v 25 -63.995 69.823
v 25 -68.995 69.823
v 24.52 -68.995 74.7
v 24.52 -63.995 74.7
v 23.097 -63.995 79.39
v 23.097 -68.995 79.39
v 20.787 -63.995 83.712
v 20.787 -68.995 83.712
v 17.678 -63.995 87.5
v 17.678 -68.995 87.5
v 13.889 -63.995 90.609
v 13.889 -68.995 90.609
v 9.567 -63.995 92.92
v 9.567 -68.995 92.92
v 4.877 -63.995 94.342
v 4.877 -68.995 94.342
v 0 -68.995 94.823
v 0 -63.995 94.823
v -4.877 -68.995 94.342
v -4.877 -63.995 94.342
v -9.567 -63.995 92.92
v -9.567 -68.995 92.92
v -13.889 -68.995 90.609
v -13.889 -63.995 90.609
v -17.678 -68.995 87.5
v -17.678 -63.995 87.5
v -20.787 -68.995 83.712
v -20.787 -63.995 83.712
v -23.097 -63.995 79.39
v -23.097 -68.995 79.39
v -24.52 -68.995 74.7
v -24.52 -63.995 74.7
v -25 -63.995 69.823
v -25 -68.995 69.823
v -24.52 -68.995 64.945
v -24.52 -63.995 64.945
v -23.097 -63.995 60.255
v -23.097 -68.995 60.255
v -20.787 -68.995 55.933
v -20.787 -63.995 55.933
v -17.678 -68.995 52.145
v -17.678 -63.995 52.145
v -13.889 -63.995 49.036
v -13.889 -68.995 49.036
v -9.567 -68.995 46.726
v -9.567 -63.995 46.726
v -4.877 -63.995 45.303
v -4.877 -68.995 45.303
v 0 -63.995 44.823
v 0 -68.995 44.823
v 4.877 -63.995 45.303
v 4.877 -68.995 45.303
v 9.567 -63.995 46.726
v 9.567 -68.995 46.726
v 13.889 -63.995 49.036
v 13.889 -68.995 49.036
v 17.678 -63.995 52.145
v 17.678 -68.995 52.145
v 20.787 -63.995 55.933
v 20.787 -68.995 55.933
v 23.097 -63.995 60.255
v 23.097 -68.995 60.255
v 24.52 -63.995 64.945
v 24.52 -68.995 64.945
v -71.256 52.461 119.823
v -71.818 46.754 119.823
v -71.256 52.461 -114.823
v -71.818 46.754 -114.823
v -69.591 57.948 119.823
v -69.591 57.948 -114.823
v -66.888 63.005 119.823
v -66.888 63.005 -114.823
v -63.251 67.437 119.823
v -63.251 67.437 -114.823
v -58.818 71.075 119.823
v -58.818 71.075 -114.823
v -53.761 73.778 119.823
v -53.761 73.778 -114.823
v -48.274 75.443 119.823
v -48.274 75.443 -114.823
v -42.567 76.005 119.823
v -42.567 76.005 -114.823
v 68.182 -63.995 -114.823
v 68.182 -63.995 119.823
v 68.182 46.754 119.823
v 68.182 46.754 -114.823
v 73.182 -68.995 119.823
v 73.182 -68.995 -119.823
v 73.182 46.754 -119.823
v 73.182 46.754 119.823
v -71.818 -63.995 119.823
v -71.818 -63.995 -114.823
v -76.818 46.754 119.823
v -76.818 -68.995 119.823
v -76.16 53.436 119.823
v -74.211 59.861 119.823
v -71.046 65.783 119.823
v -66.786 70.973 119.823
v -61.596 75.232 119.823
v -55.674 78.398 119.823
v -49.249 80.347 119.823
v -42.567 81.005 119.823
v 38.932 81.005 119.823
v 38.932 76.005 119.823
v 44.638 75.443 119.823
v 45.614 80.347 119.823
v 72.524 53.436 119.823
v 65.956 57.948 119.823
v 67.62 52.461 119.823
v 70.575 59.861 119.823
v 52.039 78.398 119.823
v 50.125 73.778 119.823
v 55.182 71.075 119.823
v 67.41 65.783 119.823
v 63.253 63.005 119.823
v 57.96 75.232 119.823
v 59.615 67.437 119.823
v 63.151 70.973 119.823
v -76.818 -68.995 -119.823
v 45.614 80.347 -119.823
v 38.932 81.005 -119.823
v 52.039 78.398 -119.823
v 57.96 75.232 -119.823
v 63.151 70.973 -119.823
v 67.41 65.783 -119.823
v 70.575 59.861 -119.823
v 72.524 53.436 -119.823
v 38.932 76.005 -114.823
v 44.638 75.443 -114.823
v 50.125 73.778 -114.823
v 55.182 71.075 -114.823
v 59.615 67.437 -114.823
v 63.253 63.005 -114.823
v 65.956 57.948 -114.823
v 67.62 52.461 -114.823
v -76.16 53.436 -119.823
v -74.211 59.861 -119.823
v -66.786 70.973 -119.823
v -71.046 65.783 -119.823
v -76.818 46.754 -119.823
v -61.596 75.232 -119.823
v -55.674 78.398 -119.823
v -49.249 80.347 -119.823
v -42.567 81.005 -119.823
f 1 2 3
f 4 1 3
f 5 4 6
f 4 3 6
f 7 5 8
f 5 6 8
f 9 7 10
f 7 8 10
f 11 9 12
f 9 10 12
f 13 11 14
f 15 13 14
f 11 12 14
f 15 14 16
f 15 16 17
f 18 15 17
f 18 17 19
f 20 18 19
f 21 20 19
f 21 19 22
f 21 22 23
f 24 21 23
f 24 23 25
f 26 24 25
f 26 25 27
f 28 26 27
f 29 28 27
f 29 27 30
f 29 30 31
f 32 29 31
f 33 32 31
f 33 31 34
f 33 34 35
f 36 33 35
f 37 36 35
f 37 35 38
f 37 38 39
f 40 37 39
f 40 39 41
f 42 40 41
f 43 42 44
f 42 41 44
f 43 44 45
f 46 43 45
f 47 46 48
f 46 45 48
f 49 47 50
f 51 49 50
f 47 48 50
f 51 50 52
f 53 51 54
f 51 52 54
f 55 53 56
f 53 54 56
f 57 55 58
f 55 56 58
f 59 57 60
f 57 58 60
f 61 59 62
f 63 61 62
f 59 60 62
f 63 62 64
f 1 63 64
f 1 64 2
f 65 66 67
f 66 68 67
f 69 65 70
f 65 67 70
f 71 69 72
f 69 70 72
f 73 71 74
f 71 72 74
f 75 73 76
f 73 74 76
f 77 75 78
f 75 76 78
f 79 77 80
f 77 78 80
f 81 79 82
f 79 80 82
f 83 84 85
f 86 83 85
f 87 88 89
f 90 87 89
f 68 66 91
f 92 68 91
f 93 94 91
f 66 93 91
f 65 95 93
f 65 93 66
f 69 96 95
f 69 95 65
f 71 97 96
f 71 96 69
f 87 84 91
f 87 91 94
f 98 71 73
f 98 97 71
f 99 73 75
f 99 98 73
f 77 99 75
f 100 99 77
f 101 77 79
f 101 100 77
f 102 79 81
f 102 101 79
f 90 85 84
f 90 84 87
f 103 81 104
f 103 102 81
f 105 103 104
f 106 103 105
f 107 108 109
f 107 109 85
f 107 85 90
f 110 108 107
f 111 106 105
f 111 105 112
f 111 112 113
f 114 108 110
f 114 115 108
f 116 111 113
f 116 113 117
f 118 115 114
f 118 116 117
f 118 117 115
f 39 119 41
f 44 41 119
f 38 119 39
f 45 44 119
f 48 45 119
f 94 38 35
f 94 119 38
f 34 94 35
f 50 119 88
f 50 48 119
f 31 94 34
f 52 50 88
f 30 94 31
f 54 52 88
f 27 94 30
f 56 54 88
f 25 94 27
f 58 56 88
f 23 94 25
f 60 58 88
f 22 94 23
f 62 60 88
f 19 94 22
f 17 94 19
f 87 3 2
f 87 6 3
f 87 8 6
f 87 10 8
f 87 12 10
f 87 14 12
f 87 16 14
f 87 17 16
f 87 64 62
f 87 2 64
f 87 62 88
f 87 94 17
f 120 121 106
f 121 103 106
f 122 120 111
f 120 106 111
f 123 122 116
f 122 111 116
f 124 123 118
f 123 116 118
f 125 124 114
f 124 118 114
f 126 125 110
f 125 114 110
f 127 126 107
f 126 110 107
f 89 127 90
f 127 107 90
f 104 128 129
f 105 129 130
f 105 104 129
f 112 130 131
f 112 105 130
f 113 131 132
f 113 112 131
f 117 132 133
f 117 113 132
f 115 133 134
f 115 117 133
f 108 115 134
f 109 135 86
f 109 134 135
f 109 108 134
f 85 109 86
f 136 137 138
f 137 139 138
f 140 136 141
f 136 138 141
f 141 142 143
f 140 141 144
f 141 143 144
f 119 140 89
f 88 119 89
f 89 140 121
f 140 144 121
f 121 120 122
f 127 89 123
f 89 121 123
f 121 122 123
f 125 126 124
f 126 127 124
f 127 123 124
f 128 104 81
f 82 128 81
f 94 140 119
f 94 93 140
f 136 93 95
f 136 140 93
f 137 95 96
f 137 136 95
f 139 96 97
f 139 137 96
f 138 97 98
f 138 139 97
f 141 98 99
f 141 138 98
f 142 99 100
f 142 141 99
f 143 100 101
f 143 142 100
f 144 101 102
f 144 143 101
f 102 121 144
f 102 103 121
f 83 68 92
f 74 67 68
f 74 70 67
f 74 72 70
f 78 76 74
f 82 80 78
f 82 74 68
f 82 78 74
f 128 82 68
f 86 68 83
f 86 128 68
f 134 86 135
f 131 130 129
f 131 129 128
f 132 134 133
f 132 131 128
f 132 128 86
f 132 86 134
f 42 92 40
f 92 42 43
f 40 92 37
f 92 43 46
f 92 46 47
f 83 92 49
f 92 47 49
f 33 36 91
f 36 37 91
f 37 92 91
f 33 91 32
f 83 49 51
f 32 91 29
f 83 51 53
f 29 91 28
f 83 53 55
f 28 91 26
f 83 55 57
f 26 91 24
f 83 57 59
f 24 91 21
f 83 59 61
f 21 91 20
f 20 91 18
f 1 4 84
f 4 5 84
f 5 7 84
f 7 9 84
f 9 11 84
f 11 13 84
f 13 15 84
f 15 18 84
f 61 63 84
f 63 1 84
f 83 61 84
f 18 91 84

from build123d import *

# Parameters (mm, degrees)
F1_DEPTH = 119.822524
F2_R     = 34.250378
F3_T     = -5
F4_R     = 25
F5_DEPTH = 25


with BuildPart() as f1:
    # F0 (on Top) → F1 (new body, symmetric)
    with BuildSketch(Plane.XY):
        Polygon((-76.817763, -68.995313), (73.182237, -68.995313), (73.182237, 81.004687), (-1.817763, 81.004687), (-76.817763, 81.004687), align=None)
    extrude(amount=F1_DEPTH, both=True)

    # F2
    f2_edges = [f1.edges().sort_by_distance(p)[0] for p in [
        (73.182237, 81.004687, 0),
        (-76.817763, 81.004687, 0),
    ]]
    fillet(f2_edges, radius=F2_R)

    # F3
    f3_openings = [f1.faces().sort_by_distance(p)[0] for p in [
        (-1.817763, 4.463075, 119.822524),
    ]]
    offset(amount=F3_T, openings=f3_openings)

    # F4 (on face) → F5 (cut)
    with BuildSketch(Plane.XZ.offset(68.995313)):
        with Locations((0, 69.822524)):
            Circle(F4_R)
    extrude(amount=-F5_DEPTH, mode=Mode.SUBTRACT)


solid = f1.part
